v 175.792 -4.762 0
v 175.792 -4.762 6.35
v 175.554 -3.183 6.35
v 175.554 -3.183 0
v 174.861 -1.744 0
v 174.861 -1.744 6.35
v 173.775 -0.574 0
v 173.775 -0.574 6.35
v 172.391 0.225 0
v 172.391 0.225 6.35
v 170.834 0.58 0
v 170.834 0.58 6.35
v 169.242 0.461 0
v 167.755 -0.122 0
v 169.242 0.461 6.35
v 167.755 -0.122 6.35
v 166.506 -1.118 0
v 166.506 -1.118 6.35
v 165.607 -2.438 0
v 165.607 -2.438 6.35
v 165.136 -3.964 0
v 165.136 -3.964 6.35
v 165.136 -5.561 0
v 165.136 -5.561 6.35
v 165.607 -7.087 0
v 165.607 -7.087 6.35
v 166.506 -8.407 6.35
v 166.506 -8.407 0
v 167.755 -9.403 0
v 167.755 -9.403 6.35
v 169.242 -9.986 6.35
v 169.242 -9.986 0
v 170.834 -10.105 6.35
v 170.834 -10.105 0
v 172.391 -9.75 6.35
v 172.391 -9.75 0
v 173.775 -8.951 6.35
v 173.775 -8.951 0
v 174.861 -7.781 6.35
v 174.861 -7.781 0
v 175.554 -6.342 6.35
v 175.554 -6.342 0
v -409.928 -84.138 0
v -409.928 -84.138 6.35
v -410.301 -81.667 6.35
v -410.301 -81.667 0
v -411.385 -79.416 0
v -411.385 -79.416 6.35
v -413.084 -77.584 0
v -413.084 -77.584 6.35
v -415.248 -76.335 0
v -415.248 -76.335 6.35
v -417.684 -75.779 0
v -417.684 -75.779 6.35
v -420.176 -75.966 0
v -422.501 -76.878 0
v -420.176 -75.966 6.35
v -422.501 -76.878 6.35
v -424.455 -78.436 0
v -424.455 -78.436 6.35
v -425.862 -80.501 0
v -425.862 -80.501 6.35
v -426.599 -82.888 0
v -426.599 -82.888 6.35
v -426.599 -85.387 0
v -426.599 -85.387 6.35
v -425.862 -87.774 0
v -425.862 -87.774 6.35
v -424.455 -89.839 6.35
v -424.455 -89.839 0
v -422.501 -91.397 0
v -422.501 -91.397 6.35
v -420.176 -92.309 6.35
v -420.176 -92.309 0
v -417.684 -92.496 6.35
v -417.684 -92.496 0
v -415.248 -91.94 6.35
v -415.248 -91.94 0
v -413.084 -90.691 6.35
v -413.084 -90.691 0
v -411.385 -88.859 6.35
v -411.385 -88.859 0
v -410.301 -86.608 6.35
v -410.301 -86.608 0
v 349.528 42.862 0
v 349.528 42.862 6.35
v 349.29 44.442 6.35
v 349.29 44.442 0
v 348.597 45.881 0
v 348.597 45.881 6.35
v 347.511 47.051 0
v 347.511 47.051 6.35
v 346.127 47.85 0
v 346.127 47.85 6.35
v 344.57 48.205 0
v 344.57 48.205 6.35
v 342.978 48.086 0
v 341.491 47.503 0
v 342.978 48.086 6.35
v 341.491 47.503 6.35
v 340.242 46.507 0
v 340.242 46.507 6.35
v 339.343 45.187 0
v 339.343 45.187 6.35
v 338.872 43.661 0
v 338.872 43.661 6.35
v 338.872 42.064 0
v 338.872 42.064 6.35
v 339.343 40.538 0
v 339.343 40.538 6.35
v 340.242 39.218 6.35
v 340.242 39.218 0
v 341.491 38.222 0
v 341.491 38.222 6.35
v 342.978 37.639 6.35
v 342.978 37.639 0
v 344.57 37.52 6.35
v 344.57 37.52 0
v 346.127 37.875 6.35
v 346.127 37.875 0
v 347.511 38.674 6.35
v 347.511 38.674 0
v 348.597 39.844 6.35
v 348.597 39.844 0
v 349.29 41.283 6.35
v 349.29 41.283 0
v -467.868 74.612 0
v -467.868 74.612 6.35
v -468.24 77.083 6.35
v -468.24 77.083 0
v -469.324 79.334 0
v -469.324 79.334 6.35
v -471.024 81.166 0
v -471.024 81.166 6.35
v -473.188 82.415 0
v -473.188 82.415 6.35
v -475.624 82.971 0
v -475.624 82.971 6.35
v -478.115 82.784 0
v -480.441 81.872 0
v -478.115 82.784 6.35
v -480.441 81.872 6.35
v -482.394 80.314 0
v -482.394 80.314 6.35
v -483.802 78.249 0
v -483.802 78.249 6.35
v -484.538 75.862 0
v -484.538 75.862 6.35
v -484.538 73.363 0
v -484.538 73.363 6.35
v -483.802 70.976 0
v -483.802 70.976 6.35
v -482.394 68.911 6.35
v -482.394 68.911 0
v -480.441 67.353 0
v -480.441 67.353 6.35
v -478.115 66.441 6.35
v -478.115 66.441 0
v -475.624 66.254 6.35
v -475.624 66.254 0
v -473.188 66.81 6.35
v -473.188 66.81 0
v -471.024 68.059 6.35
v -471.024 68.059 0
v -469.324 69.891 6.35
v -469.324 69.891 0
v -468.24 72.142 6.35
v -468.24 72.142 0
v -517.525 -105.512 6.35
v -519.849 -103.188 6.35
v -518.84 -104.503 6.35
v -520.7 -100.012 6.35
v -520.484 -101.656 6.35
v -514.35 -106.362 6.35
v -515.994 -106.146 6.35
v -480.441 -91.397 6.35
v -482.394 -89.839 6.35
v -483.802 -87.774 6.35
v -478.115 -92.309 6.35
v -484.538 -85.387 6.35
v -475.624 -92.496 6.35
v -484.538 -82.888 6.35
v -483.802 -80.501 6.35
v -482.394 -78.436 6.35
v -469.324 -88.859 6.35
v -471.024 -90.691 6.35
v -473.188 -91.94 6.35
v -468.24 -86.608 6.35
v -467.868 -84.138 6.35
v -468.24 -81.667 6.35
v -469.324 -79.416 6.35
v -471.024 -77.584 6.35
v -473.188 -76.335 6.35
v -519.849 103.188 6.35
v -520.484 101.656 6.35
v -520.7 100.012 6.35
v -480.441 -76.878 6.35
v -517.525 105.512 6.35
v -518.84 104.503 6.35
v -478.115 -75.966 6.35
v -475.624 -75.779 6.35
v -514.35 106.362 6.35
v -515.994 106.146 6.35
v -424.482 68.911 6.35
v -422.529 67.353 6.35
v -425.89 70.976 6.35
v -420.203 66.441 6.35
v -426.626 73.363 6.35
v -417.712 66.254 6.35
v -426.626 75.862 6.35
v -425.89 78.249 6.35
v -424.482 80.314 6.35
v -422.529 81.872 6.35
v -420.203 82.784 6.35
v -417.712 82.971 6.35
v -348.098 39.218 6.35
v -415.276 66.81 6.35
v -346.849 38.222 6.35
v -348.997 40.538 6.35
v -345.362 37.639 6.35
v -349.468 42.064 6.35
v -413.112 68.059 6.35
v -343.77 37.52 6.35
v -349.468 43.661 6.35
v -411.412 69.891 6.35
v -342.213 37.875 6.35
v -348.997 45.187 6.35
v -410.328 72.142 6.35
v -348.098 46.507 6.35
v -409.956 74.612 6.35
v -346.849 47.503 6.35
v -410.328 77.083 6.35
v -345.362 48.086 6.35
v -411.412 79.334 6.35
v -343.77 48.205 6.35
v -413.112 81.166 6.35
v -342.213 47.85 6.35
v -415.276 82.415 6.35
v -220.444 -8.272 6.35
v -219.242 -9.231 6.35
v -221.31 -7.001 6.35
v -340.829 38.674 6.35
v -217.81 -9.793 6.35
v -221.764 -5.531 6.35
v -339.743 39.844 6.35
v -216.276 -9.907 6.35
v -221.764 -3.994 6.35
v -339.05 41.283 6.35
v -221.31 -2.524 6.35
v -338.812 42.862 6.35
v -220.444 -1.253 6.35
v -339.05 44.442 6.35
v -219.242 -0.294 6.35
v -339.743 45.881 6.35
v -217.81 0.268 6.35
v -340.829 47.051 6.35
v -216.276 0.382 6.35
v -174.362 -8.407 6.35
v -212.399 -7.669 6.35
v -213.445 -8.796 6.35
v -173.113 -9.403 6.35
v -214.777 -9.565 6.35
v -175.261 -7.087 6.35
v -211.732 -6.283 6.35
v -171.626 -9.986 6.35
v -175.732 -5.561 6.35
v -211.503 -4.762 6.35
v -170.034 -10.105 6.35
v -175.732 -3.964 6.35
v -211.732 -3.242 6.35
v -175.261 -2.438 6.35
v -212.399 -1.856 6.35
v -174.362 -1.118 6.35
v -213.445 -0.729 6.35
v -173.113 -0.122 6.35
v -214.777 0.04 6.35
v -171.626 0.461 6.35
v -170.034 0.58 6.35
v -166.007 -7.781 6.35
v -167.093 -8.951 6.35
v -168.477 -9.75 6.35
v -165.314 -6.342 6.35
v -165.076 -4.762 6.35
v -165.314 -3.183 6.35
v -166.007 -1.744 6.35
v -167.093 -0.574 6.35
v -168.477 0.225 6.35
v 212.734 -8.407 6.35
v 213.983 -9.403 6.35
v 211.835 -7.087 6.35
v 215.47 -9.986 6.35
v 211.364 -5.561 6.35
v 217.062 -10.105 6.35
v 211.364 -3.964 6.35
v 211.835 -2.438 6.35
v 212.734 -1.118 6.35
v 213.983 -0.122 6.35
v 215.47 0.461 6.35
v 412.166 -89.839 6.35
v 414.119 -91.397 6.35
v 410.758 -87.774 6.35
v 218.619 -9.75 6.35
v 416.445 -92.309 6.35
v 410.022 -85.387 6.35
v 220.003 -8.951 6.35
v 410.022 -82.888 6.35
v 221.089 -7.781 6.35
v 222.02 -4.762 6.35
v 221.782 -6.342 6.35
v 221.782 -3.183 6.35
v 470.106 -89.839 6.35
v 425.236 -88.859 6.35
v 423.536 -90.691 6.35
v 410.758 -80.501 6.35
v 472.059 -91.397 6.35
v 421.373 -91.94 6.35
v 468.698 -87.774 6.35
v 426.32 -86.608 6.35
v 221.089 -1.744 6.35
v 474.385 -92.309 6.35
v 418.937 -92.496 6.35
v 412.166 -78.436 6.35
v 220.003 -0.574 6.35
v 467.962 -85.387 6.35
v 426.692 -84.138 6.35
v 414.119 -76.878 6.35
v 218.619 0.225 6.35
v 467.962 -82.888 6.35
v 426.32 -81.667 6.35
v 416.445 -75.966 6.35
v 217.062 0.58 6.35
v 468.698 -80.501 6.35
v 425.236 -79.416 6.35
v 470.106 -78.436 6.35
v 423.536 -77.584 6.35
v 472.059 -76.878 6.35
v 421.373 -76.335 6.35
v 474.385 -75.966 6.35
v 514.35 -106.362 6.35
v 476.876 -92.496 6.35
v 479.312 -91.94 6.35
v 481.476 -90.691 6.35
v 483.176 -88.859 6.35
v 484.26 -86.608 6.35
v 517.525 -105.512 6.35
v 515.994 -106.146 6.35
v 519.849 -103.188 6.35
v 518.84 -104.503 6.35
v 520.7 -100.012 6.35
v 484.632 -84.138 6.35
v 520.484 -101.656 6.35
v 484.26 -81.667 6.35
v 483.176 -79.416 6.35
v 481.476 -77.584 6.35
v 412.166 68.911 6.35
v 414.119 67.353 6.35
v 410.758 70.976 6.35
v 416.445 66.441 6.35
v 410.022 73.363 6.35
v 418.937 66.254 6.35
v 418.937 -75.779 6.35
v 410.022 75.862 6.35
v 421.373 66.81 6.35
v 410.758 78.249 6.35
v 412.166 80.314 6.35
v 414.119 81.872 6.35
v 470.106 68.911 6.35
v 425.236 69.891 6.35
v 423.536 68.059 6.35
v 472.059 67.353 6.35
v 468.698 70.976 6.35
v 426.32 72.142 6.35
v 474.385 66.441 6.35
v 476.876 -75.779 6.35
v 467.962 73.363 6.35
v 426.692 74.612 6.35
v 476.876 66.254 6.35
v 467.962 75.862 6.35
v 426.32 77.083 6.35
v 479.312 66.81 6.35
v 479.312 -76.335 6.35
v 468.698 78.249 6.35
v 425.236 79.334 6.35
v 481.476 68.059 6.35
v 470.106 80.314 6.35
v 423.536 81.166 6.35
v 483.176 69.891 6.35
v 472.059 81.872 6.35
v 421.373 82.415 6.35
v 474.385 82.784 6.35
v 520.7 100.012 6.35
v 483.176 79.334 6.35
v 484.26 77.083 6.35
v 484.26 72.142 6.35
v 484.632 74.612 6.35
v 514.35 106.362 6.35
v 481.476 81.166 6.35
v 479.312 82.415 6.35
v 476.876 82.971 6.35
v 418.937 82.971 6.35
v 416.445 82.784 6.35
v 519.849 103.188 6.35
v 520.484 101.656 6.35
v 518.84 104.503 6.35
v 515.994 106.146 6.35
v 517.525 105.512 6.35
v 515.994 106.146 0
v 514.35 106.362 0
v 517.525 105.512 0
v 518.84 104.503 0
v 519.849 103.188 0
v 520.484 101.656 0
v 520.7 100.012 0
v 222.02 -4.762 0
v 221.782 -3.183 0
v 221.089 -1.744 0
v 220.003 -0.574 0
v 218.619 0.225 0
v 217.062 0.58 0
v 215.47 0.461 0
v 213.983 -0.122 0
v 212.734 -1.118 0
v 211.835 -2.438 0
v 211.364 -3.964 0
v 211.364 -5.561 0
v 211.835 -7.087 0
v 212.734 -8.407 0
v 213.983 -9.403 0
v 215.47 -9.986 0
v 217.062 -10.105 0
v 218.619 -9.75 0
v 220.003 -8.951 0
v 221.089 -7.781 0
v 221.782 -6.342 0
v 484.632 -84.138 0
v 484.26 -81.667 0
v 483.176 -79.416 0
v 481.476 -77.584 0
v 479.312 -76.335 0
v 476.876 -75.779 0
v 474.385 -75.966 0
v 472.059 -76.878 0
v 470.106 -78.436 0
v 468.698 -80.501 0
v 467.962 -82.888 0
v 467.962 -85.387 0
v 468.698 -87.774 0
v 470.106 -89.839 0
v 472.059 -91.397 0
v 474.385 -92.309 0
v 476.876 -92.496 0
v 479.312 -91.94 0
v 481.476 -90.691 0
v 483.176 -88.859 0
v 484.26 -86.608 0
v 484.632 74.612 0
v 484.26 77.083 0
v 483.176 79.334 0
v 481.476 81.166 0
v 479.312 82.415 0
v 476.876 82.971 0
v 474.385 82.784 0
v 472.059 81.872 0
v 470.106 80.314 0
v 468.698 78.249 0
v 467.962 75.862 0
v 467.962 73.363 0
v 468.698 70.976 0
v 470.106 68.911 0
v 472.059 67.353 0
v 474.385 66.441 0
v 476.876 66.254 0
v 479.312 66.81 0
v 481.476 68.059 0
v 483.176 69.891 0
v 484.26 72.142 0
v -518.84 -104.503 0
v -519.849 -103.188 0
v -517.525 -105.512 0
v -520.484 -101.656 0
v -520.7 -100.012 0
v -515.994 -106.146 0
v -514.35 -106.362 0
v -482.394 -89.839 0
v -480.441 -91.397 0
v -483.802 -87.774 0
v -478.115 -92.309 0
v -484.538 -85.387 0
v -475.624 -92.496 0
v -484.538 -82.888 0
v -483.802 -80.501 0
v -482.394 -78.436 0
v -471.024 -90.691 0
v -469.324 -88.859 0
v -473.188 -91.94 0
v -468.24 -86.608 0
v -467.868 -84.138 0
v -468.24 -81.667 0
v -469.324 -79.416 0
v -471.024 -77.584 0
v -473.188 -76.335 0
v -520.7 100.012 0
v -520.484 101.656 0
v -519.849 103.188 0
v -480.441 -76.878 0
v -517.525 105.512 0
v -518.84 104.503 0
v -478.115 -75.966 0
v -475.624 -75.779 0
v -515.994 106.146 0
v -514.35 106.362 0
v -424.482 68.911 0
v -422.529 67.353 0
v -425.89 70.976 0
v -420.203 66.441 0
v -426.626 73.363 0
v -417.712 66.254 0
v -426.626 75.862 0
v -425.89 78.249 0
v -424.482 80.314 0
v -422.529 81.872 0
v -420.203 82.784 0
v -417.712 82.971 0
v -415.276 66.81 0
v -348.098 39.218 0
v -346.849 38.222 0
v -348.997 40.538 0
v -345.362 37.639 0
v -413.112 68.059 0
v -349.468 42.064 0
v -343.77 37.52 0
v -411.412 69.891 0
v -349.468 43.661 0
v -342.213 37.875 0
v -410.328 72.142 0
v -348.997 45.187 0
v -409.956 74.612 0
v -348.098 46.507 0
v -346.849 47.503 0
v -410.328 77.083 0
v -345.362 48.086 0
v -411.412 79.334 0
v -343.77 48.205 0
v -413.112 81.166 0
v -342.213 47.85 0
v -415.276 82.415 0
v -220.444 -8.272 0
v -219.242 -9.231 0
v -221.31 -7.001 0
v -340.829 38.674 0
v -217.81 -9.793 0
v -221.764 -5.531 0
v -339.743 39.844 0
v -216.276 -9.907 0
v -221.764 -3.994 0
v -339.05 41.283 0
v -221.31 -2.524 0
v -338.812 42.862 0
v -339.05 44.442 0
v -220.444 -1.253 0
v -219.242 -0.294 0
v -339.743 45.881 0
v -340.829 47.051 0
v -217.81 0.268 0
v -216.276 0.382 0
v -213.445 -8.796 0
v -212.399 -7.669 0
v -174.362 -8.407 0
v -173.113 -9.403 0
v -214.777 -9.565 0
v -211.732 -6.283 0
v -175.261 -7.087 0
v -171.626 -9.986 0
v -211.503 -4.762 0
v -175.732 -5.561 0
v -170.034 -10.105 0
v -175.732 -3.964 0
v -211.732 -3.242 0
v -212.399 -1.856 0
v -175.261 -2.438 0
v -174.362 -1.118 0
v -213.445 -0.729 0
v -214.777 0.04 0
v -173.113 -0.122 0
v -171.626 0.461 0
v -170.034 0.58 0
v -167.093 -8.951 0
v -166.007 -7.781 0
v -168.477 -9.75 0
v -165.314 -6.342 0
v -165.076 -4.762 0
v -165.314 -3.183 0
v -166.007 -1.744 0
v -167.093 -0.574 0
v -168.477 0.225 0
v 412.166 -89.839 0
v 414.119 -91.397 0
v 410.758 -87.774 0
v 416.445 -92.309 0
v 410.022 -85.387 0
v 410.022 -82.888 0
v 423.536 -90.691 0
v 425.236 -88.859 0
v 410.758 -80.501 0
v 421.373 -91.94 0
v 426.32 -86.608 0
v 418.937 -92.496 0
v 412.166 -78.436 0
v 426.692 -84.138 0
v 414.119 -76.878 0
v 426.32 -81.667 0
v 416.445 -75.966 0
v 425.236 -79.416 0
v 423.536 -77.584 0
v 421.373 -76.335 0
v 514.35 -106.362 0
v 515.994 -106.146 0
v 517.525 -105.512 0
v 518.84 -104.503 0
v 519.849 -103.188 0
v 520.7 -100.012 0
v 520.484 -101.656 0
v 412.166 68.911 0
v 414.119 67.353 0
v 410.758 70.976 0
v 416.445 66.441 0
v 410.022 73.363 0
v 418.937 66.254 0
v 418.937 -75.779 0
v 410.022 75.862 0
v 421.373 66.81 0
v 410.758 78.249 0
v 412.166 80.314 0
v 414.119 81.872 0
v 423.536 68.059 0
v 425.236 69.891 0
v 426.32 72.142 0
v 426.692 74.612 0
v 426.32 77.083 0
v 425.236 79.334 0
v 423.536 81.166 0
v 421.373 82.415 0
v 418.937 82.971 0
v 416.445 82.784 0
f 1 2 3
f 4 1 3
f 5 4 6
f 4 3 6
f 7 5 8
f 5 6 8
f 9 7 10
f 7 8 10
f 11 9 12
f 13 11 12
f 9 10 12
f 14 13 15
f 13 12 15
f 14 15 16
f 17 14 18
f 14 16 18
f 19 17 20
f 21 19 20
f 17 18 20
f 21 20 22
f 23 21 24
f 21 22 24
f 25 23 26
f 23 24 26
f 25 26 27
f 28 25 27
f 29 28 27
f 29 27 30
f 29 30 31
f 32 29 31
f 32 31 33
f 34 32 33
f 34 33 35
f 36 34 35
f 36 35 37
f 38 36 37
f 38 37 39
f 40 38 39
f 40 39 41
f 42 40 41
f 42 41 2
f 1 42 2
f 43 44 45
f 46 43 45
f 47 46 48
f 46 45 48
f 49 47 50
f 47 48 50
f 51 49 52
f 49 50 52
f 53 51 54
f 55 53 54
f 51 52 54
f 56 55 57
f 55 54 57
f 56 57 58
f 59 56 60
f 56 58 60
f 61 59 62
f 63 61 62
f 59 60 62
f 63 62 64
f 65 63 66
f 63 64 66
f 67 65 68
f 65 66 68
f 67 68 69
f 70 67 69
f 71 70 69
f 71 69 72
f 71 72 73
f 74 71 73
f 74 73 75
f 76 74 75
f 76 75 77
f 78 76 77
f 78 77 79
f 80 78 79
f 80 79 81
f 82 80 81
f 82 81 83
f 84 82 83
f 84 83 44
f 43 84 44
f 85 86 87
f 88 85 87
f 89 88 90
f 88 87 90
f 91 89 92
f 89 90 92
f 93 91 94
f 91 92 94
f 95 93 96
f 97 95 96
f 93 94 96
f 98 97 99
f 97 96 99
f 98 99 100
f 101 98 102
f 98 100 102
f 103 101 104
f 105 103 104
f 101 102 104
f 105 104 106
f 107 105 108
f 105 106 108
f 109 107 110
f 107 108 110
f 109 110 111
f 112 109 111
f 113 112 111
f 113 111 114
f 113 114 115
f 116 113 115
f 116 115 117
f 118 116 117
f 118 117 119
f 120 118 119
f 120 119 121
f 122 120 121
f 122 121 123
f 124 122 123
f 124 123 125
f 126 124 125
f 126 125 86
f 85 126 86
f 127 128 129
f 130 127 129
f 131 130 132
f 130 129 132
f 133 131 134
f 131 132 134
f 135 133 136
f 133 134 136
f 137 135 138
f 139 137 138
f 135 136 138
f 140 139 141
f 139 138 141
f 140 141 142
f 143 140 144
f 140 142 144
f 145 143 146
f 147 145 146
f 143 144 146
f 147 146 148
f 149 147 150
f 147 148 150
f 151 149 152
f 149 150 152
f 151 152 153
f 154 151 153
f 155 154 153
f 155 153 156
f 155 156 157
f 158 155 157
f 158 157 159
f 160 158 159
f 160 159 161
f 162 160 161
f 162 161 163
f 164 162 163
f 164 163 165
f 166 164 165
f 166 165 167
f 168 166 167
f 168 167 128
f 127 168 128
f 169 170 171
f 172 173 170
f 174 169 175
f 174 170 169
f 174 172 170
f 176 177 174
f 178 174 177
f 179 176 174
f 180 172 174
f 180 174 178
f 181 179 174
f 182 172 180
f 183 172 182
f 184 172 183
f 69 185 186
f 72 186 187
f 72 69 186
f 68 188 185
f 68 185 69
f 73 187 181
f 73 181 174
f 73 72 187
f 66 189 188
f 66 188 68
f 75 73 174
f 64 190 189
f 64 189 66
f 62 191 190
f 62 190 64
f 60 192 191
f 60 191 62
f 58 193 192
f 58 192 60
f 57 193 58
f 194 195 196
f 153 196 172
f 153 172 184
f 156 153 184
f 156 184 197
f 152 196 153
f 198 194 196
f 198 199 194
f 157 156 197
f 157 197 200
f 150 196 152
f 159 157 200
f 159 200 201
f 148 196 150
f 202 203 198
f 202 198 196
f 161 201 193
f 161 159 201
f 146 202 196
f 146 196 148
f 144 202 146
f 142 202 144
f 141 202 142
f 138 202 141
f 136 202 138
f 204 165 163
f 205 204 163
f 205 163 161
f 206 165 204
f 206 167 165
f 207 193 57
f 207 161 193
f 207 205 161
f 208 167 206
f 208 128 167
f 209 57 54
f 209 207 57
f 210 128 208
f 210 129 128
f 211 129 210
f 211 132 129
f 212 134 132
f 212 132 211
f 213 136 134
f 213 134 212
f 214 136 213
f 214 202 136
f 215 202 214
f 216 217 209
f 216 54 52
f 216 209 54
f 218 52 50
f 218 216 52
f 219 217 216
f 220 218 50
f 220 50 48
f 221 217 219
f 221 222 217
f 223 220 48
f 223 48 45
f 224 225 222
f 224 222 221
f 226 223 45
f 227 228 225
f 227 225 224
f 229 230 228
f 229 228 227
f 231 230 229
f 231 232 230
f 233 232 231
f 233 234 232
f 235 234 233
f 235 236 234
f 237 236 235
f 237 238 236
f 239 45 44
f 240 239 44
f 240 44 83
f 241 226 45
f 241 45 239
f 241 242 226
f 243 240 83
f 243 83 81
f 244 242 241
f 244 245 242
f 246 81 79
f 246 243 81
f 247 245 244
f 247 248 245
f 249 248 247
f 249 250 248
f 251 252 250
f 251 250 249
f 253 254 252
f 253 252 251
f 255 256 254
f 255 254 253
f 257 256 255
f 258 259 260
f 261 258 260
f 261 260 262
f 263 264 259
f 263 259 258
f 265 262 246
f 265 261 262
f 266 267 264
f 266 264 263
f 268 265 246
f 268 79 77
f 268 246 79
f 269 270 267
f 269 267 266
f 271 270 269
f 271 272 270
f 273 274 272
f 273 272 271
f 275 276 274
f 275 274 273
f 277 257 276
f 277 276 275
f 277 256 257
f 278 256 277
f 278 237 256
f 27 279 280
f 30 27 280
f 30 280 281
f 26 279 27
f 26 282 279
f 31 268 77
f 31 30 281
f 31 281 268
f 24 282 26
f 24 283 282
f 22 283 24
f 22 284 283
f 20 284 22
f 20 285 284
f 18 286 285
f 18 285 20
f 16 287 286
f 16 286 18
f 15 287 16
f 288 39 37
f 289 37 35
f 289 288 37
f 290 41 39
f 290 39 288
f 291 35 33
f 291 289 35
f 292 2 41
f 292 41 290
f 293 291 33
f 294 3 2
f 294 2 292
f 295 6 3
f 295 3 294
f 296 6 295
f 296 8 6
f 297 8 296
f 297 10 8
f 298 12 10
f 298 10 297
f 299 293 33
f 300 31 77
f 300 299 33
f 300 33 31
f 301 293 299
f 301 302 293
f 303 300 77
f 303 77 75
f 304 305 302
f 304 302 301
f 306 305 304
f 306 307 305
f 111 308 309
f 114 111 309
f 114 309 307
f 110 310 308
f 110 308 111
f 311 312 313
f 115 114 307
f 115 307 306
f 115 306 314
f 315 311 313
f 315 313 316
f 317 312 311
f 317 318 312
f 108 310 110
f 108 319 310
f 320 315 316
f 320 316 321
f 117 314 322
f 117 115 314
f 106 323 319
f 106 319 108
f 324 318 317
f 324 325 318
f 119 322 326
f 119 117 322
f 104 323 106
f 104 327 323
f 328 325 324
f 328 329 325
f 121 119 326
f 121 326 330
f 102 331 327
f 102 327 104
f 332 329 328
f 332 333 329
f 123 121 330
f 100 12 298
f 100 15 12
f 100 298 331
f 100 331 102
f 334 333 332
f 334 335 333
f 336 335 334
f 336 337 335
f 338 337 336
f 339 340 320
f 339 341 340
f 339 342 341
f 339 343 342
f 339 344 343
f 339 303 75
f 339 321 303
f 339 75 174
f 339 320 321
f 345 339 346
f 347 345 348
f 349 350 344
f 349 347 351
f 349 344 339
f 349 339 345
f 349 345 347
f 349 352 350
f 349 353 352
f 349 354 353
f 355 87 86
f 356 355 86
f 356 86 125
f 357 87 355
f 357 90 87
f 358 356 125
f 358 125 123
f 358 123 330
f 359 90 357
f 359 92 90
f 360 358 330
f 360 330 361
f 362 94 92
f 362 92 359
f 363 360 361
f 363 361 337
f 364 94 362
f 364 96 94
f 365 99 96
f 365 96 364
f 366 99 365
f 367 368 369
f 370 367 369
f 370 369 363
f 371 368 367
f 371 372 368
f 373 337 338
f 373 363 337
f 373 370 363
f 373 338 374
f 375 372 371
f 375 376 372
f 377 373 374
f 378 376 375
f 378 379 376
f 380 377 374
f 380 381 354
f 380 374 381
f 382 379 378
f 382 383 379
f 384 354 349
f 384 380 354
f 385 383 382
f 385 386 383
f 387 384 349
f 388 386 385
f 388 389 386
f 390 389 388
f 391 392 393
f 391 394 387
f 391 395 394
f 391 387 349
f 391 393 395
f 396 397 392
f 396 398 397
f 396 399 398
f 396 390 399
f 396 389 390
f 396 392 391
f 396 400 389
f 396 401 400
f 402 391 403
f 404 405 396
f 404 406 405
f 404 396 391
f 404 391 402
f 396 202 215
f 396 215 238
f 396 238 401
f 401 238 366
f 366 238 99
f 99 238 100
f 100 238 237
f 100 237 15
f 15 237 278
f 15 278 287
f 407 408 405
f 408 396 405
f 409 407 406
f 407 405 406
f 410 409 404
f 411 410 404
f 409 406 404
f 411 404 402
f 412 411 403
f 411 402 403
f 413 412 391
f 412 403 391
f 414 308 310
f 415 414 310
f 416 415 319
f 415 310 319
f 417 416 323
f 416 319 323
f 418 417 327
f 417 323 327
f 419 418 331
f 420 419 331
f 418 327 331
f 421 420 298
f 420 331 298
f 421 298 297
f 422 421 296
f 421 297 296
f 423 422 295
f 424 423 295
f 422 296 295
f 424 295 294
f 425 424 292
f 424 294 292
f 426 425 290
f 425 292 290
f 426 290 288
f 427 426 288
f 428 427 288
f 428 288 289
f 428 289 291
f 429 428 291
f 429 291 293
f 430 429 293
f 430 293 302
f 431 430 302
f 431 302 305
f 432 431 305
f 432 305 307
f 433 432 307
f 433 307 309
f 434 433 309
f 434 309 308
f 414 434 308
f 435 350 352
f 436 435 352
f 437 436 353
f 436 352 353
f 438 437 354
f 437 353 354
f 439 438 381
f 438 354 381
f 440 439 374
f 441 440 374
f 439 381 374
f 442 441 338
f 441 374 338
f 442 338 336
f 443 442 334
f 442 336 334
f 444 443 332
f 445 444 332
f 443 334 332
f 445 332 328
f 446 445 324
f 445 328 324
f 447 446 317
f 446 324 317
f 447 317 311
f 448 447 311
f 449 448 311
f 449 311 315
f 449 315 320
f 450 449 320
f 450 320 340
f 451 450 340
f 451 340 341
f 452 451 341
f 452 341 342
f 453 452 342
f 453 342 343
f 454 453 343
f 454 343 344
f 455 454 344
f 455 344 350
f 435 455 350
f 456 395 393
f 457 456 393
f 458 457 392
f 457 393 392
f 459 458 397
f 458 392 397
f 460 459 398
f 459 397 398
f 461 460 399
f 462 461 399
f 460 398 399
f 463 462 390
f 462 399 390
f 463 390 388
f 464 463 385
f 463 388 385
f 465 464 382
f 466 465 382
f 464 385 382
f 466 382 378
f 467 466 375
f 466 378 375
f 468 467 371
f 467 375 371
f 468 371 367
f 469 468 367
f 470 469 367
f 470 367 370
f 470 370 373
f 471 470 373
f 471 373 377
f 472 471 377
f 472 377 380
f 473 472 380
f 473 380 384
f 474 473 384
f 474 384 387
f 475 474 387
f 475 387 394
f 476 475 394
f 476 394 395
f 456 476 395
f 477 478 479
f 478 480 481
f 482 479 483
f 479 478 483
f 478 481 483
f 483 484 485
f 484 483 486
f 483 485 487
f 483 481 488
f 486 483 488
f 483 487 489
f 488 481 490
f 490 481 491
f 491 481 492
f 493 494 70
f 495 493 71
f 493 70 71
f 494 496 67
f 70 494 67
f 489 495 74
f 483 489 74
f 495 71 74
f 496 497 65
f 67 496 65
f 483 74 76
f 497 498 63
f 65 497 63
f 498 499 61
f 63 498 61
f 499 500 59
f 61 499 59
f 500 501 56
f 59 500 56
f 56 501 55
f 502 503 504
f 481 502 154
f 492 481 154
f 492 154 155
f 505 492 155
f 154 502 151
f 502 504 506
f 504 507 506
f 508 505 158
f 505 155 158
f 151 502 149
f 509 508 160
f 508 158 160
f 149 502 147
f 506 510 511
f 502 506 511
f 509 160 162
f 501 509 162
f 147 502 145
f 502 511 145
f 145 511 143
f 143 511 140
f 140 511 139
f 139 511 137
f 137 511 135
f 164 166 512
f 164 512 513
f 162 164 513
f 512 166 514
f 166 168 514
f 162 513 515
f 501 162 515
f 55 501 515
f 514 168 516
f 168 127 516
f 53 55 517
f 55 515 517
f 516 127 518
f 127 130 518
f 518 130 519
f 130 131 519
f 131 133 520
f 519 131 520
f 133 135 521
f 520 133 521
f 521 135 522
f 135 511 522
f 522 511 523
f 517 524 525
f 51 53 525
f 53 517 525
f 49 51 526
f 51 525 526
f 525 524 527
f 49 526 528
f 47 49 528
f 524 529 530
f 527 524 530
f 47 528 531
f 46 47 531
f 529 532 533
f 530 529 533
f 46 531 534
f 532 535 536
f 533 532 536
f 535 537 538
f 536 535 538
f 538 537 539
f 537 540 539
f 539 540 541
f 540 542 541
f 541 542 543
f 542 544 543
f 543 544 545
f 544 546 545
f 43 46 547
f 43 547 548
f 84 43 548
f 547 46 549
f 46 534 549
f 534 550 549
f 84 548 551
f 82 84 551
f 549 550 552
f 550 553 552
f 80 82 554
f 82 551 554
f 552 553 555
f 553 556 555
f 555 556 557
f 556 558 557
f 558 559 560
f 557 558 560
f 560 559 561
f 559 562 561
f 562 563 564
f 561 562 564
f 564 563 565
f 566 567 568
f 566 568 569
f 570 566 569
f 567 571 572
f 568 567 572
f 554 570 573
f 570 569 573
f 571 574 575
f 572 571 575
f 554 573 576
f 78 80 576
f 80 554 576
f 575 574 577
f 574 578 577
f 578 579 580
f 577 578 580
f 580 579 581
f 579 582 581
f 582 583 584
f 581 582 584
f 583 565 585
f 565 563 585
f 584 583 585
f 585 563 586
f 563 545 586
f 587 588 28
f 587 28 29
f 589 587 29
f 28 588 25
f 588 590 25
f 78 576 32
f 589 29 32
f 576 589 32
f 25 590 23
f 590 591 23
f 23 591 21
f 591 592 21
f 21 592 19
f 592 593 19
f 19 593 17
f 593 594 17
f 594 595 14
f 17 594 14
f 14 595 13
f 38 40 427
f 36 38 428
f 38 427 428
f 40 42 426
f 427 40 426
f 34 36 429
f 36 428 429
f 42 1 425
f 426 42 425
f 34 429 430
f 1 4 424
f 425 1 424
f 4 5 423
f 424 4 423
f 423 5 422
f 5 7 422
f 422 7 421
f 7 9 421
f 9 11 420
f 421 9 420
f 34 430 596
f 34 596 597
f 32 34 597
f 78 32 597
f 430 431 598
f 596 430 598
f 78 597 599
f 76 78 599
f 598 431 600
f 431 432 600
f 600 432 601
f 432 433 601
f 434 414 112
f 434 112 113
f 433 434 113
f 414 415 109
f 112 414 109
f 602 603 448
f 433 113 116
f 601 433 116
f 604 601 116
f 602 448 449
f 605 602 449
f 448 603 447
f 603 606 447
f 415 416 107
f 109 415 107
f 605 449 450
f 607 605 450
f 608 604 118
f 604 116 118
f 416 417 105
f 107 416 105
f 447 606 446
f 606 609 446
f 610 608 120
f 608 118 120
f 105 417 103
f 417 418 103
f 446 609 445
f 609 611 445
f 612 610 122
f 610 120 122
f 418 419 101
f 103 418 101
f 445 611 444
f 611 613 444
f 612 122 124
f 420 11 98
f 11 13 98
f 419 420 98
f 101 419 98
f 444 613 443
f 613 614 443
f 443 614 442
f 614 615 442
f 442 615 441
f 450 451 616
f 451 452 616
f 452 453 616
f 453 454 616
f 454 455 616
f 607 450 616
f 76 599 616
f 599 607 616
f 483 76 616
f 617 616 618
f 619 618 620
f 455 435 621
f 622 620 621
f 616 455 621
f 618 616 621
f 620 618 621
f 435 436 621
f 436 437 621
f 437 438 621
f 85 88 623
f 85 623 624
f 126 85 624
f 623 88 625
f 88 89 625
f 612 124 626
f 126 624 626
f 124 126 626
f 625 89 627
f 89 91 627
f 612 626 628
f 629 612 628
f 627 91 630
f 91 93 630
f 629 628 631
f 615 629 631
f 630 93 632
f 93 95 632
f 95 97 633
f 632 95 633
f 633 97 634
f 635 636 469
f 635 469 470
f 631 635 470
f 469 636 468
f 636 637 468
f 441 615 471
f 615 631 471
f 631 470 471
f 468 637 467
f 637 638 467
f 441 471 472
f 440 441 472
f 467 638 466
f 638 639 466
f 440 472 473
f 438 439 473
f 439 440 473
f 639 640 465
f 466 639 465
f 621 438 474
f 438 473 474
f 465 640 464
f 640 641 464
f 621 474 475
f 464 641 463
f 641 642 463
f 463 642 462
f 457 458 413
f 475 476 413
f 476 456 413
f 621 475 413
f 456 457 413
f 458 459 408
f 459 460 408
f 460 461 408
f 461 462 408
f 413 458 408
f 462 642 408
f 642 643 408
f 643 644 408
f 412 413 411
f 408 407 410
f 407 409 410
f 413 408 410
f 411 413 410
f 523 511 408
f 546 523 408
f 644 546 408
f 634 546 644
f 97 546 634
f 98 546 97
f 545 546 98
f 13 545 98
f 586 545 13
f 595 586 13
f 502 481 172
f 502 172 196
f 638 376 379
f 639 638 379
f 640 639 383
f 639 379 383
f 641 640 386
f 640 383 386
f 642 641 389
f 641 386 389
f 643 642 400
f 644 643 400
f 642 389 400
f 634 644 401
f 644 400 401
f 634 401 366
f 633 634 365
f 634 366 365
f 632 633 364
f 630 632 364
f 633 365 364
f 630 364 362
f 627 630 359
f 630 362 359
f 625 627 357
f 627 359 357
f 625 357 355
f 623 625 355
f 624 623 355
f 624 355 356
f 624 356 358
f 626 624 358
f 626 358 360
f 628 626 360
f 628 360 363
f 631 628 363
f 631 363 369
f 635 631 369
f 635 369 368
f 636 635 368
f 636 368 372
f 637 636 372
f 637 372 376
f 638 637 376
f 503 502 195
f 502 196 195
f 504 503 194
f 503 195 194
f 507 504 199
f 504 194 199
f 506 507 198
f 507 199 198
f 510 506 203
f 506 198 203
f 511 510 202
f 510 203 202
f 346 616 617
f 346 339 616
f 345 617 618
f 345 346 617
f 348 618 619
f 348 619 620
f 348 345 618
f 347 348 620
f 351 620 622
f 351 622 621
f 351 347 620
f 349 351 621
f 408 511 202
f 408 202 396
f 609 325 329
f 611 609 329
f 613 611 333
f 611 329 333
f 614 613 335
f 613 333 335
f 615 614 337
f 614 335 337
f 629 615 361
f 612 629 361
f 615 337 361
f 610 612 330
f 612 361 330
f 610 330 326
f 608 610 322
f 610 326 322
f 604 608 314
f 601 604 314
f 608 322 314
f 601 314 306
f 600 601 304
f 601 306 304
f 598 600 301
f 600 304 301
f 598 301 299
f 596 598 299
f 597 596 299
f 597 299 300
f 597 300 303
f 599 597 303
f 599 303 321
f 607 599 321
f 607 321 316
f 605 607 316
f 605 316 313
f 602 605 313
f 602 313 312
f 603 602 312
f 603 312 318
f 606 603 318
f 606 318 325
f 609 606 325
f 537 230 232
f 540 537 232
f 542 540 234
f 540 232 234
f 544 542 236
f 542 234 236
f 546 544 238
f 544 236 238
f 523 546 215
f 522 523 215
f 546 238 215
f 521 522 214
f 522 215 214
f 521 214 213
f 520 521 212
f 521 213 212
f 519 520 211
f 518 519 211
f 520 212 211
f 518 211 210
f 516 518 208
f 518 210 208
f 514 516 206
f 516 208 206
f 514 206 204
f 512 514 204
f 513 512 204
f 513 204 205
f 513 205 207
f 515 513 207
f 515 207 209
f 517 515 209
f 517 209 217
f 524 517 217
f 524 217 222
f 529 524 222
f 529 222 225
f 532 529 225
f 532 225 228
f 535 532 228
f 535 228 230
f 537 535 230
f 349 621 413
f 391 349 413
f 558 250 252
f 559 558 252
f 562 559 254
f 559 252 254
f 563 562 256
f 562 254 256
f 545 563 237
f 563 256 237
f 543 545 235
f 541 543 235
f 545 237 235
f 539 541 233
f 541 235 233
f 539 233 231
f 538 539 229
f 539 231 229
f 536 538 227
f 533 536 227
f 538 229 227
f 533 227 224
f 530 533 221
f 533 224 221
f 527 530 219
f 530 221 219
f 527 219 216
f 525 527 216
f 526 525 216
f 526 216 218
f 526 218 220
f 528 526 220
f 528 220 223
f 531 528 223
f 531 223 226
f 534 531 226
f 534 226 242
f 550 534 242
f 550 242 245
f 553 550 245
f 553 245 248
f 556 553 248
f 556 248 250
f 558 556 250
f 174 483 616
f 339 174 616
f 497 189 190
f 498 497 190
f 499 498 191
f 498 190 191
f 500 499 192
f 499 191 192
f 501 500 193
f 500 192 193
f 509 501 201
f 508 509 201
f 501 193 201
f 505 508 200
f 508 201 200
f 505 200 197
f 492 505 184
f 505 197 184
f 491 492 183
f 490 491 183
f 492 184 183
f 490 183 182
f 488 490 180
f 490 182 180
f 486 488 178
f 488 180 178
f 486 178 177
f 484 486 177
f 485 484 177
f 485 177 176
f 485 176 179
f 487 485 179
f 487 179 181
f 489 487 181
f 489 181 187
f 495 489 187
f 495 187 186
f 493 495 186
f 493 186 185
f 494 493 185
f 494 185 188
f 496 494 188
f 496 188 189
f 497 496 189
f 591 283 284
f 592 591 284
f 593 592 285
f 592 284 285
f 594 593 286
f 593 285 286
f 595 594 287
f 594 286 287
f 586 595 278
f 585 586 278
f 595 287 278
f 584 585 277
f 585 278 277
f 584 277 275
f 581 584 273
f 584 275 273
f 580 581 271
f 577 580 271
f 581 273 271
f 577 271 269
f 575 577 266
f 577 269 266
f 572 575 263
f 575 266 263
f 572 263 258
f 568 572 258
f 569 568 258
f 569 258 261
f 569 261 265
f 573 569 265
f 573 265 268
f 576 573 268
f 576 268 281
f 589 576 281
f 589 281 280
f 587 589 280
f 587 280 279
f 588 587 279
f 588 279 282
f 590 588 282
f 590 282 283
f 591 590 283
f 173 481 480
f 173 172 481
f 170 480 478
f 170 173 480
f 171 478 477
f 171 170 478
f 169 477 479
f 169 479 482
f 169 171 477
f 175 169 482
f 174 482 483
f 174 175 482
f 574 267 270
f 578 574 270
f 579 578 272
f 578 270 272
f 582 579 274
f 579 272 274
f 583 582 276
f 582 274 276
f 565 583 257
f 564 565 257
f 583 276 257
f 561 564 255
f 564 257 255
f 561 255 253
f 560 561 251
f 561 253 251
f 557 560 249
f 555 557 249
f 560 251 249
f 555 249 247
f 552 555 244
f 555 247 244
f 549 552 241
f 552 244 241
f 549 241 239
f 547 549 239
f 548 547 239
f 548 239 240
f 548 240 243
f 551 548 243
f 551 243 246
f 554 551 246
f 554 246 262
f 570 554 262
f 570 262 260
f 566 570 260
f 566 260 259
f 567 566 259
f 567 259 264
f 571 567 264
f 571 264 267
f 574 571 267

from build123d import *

# Parameters (mm, degrees)
SKETCH1_W           = 1041.4
SKETCH1_H           = 212.725
BOSS_EXTRUDE1_DEPTH = 6.35
SKETCH4_R           = 8.382
CUT_EXTRUDE1_DEPTH  = 532.490163508
SKETCH5_R           = 5.159375
SKETCH5_R_2         = 5.3578125
CUT_EXTRUDE2_DEPTH  = 532.490163508
FILLET1_R           = 6.35


with BuildPart() as part:
    # Sketch1 → Boss-Extrude1 (new body)
    with BuildSketch(Plane.XY):
        Rectangle(SKETCH1_W, SKETCH1_H)
    extrude(amount=BOSS_EXTRUDE1_DEPTH)

    # Sketch4 → Cut-Extrude1 (cut, through all)
    with BuildSketch(Plane.XY.offset(6.35)):
        with Locations((476.25, 74.6125)):
            Circle(SKETCH4_R)
        with Locations((418.310341604, 74.6125)):
            Circle(SKETCH4_R)
        with Locations((-476.25, 74.6125)):
            Circle(SKETCH4_R)
        with Locations((-418.338, 74.6125)):
            Circle(SKETCH4_R)
        with Locations((476.25, -84.1375)):
            Circle(SKETCH4_R)
        with Locations((418.310341686, -84.1375)):
            Circle(SKETCH4_R)
        with Locations((-476.25, -84.1375)):
            Circle(SKETCH4_R)
        with Locations((-418.310341686, -84.1375)):
            Circle(SKETCH4_R)
    extrude(amount=-CUT_EXTRUDE1_DEPTH, mode=Mode.SUBTRACT)

    # Sketch5 → Cut-Extrude2 (cut, through all)
    with BuildSketch(Plane.XY.offset(6.35)):
        with Locations((-216.662, -4.7625)):
            Circle(SKETCH5_R)
        with Locations((-170.434, -4.7625)):
            Circle(SKETCH5_R_2)
        with Locations((170.434, -4.7625)):
            Circle(SKETCH5_R_2)
        with Locations((216.662, -4.7625)):
            Circle(SKETCH5_R_2)
        with Locations((344.17, 42.8625)):
            Circle(SKETCH5_R_2)
        with Locations((-344.17, 42.8625)):
            Circle(SKETCH5_R_2)
    extrude(amount=-CUT_EXTRUDE2_DEPTH, mode=Mode.SUBTRACT)

    # Fillet1
    fillet1_edges = [part.edges().sort_by_distance(p)[0] for p in [
        (-520.7, -106.3625, 3.175),
        (-520.7, 106.3625, 3.175),
        (520.7, 106.3625, 3.175),
        (520.7, -106.3625, 3.175),
    ]]
    fillet(fillet1_edges, radius=FILLET1_R)


solid = part.part
